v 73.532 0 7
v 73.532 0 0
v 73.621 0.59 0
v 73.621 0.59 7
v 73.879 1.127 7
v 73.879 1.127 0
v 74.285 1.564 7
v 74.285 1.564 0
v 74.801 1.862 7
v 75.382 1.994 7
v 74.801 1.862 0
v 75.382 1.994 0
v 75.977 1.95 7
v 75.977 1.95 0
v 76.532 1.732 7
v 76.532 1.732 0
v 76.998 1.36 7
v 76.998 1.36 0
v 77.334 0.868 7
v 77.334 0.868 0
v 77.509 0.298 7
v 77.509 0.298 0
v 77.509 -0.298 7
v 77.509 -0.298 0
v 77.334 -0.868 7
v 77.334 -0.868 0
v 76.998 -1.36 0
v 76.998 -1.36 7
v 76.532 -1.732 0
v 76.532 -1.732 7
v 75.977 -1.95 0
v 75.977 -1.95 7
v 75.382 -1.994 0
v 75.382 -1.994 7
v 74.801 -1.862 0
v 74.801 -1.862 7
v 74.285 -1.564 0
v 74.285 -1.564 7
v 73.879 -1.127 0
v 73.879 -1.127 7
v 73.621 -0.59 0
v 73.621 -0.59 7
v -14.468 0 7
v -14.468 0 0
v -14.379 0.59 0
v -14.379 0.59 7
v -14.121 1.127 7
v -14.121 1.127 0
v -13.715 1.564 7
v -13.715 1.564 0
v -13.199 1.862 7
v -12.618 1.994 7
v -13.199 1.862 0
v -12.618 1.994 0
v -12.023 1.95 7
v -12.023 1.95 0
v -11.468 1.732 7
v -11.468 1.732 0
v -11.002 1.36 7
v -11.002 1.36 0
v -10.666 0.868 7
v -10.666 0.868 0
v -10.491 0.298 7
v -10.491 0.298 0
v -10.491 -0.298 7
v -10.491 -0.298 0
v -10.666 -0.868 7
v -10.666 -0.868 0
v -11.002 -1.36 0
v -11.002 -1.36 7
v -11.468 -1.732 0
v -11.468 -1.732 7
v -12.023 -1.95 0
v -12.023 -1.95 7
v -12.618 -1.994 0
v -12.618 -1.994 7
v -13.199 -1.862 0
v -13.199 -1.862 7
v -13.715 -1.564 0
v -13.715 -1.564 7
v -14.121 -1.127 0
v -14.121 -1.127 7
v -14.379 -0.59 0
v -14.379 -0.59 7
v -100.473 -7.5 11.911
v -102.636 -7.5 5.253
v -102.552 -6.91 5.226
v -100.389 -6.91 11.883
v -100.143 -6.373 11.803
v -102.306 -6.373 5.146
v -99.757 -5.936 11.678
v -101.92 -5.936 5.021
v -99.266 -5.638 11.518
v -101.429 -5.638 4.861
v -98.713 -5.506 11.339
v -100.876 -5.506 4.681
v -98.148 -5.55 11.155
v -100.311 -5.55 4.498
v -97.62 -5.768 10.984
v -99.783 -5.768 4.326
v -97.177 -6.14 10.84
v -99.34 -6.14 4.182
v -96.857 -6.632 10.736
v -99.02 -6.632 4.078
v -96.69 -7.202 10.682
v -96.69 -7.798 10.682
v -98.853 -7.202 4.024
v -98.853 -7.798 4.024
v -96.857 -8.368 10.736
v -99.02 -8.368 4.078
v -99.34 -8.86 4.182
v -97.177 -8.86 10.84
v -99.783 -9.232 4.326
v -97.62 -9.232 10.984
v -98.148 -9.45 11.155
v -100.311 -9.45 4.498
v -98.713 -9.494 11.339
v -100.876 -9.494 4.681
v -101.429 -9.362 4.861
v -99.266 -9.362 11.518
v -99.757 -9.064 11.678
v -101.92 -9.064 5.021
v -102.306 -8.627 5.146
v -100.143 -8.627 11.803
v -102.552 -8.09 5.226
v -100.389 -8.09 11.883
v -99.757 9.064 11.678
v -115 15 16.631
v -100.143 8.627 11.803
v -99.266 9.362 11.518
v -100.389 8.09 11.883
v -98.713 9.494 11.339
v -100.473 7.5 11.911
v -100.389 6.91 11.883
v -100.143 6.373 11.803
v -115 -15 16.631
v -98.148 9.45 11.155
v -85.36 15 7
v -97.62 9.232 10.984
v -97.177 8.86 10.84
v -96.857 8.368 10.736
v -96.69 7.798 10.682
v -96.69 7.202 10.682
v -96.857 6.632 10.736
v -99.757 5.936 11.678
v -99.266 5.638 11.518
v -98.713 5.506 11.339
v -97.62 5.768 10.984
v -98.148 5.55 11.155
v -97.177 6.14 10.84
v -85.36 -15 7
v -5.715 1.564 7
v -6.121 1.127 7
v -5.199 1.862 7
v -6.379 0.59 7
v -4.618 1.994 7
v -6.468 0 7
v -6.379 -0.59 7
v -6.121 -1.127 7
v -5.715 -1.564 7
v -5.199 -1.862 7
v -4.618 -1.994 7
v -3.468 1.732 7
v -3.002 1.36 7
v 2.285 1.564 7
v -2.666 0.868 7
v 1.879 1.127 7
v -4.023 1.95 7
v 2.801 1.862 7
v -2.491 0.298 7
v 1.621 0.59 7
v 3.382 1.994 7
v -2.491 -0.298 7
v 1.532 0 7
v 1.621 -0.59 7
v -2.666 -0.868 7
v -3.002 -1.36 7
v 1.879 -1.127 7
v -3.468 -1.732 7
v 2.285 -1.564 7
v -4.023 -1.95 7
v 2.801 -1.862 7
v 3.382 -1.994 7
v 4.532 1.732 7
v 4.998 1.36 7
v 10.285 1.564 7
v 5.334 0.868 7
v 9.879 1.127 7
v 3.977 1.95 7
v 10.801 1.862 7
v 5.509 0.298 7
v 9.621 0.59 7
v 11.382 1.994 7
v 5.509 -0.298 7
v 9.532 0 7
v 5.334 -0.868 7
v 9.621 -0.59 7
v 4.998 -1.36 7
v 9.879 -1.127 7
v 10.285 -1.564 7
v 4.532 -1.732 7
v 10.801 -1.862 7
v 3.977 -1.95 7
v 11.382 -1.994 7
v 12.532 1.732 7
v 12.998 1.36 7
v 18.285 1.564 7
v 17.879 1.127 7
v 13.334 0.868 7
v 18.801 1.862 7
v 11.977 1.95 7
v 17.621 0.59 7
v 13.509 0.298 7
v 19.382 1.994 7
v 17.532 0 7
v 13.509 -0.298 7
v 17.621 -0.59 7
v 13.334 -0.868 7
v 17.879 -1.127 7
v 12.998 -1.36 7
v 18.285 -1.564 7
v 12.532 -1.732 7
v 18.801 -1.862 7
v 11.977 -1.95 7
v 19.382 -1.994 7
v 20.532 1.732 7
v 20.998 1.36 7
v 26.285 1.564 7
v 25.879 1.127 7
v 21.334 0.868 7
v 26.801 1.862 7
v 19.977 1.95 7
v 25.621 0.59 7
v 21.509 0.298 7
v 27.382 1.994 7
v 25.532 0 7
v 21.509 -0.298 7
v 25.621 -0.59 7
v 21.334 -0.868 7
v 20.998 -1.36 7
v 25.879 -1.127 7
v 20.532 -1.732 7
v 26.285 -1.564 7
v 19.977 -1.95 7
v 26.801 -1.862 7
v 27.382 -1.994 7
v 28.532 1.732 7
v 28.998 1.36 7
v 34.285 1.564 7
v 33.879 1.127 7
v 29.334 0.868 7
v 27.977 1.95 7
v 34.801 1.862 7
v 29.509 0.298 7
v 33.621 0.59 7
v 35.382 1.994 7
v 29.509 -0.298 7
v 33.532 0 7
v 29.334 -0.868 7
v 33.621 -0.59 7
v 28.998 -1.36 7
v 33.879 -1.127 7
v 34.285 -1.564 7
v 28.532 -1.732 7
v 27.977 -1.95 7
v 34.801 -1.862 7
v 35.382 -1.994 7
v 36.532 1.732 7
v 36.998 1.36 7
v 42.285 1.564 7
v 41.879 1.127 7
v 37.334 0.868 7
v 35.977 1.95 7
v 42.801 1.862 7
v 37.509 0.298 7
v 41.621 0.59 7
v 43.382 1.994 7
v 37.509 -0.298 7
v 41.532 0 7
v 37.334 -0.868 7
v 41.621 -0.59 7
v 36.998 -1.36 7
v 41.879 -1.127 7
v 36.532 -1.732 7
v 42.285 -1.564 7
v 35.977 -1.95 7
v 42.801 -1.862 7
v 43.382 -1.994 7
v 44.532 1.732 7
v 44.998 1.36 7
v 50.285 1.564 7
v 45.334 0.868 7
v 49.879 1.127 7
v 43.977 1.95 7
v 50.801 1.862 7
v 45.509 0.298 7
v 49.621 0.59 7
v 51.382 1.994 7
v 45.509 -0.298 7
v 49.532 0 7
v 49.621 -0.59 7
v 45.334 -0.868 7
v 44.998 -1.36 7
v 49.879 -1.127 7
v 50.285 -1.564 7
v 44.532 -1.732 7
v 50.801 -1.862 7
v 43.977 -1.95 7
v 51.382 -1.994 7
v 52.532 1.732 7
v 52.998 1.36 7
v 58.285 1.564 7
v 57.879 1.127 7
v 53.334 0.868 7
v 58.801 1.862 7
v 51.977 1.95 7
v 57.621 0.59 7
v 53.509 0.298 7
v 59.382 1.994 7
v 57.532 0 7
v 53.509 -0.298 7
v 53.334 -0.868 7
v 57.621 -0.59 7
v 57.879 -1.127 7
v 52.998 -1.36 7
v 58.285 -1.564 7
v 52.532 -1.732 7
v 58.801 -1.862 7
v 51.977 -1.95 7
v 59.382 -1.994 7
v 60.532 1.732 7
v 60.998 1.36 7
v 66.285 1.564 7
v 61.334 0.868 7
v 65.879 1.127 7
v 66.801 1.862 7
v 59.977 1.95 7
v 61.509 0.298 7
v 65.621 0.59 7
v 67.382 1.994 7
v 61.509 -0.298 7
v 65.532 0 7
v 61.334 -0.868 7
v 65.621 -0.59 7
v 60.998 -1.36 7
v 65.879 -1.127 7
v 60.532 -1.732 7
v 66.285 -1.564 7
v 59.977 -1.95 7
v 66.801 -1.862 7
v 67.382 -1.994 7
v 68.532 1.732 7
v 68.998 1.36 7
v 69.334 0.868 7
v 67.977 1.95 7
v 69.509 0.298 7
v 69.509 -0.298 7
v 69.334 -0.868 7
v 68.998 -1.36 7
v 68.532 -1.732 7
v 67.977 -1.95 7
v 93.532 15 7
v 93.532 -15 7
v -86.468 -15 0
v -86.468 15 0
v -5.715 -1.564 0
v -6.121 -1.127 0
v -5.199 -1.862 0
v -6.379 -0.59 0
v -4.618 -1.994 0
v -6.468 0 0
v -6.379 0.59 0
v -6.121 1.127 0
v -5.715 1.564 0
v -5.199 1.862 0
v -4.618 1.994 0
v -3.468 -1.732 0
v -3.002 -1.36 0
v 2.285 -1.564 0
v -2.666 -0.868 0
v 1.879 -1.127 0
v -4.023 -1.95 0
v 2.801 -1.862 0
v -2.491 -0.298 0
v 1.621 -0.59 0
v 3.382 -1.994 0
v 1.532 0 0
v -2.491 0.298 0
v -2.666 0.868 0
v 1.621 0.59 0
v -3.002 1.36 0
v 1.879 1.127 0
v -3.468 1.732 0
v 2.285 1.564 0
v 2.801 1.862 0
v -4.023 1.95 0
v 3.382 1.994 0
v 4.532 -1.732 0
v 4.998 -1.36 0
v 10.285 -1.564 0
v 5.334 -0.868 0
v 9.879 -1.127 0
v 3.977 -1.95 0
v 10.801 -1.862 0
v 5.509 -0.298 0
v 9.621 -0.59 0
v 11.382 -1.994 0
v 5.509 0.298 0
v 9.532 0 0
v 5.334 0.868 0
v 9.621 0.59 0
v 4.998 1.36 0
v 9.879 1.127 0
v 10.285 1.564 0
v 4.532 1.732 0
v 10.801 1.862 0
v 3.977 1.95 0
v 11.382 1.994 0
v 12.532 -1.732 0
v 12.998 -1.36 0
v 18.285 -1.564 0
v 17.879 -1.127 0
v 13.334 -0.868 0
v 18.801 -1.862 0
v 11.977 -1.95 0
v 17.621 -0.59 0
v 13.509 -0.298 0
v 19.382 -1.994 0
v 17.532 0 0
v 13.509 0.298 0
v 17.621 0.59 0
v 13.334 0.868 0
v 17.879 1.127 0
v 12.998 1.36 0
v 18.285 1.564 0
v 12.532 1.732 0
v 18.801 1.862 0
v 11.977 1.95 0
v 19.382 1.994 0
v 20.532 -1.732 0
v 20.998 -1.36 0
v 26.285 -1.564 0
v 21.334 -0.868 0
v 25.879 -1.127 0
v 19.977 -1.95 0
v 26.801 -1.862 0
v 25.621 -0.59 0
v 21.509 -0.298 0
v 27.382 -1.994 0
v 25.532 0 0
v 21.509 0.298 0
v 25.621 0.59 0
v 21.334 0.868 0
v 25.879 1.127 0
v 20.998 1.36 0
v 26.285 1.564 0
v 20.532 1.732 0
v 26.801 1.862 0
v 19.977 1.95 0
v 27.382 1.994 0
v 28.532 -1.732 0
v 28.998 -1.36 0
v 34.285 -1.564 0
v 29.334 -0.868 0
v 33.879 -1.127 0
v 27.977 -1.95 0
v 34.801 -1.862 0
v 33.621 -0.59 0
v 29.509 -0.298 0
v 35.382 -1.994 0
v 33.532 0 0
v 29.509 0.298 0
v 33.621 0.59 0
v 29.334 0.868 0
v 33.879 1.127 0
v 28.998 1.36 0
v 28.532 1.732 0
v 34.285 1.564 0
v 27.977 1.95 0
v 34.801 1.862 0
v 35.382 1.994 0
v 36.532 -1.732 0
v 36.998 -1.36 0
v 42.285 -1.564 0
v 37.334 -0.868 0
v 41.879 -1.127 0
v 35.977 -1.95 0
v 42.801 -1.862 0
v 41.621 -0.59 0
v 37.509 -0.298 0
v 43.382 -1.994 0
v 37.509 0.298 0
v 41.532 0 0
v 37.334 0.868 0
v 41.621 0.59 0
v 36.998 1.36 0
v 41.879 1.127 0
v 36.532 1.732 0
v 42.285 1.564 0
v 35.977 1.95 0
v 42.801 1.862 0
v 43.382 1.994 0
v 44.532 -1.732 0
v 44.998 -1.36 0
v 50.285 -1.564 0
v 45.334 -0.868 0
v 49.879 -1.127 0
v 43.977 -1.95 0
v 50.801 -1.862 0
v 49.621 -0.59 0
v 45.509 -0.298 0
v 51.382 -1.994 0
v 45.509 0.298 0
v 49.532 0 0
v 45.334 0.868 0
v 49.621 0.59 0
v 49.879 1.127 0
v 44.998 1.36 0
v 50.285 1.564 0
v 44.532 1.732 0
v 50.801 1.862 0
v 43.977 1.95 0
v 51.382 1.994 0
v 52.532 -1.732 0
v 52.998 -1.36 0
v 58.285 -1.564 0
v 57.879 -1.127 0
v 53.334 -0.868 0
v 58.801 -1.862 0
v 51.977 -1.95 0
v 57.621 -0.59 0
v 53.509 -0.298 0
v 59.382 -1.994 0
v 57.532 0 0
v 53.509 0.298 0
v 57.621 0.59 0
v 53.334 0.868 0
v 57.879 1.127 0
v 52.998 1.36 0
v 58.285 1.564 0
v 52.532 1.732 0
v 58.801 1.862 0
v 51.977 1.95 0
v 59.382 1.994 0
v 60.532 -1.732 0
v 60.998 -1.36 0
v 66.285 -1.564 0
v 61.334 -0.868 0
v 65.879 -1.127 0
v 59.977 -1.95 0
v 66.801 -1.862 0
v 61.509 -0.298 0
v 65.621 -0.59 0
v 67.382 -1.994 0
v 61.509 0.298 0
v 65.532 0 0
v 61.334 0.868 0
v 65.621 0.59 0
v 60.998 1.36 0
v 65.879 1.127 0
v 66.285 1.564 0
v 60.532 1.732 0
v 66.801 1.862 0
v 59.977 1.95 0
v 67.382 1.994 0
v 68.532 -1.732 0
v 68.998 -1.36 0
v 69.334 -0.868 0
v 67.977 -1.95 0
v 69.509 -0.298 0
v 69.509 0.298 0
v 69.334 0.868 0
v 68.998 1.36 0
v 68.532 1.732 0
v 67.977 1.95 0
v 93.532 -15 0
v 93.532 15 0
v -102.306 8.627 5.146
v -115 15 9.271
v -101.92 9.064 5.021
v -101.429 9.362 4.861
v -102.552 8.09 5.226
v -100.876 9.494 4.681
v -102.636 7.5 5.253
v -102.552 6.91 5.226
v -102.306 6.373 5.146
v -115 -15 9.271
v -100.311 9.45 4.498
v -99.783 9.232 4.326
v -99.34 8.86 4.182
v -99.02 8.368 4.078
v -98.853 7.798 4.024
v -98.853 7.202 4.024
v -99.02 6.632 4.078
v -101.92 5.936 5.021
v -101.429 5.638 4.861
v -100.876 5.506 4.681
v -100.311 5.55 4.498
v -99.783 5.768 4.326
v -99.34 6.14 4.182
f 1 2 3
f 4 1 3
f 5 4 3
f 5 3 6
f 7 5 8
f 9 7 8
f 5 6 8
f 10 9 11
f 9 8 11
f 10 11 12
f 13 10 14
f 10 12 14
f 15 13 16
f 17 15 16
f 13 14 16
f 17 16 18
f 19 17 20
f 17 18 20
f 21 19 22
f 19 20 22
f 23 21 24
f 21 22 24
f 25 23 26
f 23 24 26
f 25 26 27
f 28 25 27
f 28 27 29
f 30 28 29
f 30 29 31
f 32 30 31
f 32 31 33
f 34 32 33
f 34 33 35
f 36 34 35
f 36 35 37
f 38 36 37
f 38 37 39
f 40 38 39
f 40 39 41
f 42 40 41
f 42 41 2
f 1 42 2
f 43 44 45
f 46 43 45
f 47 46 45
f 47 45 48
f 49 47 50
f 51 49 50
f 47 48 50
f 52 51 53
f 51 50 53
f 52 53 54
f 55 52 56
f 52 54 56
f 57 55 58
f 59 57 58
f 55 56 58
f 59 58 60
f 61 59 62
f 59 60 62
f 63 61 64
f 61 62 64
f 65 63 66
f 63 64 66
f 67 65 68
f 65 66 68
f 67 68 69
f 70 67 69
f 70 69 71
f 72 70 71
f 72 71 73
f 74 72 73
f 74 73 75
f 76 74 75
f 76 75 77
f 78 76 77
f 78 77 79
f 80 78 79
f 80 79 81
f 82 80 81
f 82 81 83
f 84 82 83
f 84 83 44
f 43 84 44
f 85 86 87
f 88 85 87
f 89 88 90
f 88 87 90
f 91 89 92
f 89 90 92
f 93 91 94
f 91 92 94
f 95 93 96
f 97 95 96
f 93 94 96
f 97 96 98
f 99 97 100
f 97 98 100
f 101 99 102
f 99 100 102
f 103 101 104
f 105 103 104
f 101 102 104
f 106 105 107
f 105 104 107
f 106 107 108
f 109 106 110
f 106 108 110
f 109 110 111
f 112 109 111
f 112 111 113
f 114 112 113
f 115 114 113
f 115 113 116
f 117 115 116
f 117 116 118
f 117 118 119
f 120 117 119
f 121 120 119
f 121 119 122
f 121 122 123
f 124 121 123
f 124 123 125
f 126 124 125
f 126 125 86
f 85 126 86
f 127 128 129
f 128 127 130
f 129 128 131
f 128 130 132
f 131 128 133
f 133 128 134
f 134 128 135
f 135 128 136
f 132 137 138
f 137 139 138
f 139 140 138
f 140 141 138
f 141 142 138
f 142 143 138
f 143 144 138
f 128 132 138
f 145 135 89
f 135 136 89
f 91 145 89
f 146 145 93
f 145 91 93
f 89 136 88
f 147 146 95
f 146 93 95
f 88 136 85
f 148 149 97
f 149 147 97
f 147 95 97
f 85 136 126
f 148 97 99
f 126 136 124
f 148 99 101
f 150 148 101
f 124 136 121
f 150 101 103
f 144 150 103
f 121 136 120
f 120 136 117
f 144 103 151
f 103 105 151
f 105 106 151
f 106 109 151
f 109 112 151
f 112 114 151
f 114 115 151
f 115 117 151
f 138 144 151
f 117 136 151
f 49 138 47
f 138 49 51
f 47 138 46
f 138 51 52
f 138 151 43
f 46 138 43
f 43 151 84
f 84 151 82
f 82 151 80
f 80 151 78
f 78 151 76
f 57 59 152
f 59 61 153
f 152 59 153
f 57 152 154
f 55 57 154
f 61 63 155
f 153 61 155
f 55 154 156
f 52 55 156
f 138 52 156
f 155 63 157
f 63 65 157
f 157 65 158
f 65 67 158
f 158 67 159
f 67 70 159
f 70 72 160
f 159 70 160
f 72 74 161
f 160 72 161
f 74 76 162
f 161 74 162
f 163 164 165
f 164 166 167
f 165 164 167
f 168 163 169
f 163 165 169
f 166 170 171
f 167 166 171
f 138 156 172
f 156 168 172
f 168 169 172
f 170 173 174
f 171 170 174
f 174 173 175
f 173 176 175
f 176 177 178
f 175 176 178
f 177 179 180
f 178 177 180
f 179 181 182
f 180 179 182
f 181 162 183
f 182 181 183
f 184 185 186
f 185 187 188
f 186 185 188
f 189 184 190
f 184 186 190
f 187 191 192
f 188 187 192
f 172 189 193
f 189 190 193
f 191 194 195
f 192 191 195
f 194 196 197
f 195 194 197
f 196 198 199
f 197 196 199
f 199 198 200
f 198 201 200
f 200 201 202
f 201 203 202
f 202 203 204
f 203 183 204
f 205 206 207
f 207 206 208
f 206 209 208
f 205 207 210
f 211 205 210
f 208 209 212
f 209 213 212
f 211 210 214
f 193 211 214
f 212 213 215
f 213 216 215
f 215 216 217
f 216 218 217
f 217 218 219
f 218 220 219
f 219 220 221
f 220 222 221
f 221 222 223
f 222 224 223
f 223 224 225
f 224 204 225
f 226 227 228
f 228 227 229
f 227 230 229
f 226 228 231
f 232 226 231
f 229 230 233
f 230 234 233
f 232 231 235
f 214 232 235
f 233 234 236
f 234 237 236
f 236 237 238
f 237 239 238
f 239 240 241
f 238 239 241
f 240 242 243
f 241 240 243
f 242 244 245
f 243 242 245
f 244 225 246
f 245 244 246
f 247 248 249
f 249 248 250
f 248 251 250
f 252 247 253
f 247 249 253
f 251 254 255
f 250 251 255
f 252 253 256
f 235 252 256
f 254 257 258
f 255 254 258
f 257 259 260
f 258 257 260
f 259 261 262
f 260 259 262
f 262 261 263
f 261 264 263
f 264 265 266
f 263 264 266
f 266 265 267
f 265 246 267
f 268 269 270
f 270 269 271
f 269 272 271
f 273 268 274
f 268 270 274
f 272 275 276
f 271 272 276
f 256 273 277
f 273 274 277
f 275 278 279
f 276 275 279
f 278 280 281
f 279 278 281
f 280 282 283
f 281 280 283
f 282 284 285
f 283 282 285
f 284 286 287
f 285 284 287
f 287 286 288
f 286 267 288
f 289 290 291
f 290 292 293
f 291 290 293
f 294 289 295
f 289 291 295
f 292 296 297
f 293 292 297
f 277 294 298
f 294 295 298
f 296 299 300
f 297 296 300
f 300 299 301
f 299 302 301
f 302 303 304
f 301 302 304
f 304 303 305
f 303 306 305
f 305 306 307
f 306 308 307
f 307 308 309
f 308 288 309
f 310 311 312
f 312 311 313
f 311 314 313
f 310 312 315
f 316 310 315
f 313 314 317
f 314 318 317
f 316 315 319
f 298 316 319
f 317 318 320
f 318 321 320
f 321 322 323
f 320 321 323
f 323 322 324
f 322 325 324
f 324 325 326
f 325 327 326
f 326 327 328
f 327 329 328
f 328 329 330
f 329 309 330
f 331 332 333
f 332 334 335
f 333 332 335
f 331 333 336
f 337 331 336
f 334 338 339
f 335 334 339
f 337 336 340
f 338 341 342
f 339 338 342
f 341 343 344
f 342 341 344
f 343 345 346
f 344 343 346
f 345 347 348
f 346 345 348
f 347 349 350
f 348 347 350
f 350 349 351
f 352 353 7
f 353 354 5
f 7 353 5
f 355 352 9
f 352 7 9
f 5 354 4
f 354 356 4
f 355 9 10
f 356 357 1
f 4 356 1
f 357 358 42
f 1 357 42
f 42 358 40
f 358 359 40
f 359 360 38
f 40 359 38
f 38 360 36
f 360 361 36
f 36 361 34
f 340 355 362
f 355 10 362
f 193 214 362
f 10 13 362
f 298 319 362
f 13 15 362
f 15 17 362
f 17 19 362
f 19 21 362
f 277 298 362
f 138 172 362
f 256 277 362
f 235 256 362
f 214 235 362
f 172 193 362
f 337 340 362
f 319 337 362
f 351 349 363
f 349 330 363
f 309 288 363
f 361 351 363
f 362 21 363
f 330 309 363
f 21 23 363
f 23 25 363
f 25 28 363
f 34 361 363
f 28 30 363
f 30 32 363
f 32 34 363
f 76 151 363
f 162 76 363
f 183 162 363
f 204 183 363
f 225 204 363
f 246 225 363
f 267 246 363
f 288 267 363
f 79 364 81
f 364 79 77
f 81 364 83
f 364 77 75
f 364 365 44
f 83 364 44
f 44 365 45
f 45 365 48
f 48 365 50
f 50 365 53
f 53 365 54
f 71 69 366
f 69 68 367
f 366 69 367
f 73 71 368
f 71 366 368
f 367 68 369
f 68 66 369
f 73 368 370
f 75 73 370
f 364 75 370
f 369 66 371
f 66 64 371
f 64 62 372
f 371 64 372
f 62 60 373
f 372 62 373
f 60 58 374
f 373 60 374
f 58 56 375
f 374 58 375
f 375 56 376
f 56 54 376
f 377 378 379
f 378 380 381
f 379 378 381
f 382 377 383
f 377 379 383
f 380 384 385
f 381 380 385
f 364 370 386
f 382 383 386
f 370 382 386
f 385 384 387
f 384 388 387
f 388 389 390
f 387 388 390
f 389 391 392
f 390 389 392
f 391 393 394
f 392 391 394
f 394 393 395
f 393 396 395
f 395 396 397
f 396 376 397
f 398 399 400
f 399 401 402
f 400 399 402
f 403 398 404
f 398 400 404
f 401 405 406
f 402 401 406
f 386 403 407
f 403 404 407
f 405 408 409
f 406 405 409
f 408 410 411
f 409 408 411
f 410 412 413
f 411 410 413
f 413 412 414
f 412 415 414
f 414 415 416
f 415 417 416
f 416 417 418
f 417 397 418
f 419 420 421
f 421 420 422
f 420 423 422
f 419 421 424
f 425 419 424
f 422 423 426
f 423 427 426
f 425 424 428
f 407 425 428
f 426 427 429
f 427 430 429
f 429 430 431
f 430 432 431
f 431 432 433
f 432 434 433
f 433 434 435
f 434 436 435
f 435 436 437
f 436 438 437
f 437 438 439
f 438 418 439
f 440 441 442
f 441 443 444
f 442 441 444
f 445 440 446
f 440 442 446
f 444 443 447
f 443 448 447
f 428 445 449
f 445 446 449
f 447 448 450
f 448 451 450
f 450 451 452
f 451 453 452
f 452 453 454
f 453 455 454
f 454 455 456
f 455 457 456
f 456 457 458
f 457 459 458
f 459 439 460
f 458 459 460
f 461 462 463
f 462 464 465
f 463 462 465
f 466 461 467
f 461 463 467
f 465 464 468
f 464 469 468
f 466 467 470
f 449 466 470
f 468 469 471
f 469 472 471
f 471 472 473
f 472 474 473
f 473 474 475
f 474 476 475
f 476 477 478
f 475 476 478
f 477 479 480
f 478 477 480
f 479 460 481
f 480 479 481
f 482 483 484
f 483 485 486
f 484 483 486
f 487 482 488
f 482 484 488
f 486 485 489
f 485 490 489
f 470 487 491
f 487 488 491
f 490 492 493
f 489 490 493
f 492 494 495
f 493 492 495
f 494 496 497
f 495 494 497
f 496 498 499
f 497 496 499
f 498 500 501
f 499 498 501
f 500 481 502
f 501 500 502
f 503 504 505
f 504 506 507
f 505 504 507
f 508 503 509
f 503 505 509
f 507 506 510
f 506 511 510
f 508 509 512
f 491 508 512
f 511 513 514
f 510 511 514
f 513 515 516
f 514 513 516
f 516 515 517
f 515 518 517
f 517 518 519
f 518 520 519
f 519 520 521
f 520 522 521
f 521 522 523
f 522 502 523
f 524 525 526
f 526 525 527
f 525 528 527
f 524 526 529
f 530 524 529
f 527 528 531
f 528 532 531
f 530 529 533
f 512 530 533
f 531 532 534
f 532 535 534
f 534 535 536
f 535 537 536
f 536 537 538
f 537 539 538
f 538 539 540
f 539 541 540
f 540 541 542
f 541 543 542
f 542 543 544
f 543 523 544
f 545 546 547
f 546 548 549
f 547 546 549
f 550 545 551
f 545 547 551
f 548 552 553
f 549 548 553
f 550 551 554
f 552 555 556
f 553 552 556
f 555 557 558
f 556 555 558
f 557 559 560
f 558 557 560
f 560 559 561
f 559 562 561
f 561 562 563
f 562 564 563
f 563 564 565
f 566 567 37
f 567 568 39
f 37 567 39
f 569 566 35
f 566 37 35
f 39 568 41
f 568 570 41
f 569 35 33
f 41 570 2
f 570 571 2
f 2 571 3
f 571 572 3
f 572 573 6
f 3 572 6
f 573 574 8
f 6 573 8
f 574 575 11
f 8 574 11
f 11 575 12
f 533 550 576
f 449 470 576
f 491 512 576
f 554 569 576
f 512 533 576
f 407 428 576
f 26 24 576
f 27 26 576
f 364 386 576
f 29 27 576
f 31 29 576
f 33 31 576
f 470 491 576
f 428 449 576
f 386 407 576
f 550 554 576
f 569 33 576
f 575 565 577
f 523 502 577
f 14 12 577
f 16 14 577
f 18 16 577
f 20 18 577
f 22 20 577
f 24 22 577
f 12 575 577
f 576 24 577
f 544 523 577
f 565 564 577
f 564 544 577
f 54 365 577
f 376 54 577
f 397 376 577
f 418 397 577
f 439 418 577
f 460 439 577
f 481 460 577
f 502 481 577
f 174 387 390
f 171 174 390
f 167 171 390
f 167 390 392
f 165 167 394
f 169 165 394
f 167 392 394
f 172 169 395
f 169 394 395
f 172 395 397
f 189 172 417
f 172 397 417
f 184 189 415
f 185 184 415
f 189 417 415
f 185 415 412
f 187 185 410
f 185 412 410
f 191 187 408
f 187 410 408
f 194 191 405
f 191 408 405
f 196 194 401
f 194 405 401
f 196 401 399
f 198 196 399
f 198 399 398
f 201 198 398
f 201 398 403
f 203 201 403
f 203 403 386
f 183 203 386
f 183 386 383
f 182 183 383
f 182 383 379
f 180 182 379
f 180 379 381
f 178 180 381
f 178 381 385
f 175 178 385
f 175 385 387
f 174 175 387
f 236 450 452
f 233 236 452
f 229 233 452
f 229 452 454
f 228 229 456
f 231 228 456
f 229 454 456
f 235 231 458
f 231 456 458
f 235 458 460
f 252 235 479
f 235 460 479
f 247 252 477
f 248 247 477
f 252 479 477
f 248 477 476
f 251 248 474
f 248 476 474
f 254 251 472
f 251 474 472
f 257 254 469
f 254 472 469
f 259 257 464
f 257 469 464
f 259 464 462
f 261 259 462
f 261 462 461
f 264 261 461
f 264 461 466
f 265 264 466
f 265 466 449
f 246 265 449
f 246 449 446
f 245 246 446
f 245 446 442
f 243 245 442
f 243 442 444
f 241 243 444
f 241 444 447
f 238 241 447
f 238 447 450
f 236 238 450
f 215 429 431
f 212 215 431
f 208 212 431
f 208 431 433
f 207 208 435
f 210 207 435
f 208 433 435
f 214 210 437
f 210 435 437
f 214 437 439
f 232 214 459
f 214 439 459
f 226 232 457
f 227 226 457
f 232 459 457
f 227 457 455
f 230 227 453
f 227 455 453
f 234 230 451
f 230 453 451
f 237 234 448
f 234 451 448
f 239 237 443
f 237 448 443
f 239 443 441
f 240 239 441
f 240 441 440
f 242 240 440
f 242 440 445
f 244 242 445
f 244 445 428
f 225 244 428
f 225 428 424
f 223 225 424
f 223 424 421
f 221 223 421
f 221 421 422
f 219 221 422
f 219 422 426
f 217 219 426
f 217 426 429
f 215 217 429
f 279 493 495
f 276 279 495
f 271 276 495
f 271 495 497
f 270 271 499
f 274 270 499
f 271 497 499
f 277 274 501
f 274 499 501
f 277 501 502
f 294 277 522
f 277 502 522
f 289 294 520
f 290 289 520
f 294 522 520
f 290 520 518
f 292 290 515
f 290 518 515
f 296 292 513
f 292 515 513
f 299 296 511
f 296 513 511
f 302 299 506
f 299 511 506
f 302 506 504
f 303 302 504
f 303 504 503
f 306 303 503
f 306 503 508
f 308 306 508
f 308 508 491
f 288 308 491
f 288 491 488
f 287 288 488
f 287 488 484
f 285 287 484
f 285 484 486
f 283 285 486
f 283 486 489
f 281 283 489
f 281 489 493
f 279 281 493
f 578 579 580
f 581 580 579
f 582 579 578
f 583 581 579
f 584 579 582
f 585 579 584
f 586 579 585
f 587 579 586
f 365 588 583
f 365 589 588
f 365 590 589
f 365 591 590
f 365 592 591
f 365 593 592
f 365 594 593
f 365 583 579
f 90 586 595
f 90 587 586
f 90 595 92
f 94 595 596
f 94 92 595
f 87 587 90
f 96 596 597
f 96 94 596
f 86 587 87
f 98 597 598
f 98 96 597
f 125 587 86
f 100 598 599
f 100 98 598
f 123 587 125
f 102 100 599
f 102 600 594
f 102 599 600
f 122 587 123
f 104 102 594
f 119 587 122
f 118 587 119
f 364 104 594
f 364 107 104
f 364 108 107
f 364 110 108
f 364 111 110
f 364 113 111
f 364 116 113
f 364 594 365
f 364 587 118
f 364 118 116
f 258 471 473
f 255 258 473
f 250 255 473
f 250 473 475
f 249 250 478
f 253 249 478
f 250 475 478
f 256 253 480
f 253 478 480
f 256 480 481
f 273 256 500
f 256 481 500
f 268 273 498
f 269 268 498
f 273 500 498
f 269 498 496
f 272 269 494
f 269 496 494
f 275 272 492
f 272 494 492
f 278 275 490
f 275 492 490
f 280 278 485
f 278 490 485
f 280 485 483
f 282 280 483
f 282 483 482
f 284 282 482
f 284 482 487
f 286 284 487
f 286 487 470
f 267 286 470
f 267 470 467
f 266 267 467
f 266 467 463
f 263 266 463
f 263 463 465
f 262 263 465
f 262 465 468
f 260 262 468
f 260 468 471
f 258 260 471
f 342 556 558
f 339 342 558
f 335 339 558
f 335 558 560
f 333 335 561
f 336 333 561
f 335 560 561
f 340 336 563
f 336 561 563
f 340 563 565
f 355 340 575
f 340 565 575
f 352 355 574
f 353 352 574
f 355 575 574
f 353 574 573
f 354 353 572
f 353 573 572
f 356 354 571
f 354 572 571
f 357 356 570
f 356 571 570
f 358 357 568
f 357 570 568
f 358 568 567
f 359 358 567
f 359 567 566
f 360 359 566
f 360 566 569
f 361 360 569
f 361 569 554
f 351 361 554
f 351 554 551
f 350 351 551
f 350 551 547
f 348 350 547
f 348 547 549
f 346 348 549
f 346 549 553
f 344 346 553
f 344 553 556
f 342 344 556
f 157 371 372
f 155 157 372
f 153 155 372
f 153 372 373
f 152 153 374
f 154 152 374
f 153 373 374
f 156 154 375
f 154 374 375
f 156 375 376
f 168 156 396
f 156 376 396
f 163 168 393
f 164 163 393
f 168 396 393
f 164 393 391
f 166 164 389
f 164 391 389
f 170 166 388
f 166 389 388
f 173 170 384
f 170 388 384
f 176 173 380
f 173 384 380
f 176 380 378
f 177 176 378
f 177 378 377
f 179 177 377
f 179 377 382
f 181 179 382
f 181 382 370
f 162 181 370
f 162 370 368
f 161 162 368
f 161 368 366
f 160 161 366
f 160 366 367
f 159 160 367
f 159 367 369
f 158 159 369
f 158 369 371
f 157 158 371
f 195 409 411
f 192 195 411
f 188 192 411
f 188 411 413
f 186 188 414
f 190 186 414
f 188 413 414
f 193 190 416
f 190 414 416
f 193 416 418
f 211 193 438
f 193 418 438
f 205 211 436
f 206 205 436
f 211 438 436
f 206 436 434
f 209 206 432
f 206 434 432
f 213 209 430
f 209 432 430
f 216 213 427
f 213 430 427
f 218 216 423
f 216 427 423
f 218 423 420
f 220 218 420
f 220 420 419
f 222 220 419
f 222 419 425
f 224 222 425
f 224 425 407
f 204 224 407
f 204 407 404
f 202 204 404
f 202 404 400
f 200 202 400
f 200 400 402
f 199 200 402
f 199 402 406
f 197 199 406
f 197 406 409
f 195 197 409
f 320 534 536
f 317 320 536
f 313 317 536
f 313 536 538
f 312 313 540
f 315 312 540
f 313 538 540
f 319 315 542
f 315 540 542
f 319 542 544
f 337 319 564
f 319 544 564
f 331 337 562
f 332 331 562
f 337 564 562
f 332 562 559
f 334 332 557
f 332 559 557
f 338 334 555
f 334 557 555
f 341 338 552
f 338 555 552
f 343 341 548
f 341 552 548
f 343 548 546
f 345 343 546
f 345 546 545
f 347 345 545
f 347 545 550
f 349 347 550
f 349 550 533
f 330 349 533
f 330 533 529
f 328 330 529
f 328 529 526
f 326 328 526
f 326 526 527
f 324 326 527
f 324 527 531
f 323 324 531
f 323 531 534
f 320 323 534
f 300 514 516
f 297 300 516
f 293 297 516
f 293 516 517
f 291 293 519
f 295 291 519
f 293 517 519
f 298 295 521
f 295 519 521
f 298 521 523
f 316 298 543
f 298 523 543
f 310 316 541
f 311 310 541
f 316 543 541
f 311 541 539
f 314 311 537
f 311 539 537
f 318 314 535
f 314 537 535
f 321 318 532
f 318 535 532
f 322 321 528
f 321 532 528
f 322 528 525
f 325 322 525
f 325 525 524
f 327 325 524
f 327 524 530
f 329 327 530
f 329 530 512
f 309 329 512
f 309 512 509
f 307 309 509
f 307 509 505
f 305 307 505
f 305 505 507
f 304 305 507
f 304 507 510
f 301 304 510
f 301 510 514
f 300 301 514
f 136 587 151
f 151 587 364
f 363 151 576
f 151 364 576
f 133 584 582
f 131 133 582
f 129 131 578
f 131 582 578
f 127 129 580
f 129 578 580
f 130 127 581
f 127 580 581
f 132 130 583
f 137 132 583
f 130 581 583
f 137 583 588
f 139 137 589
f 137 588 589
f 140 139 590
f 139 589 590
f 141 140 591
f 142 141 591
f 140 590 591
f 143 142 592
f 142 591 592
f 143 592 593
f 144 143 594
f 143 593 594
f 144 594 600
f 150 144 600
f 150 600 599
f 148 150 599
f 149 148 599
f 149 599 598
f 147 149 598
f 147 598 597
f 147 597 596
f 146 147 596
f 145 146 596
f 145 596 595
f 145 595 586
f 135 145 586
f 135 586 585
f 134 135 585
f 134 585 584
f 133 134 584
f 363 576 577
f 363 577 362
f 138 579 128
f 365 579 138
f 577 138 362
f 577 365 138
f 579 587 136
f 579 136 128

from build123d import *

# Parameters (mm, degrees)
SKETCH1_W           = 230
SKETCH1_H           = 30
BOSS_EXTRUDE1_DEPTH = 50
CUT_EXTRUDE1_DEPTH  = 50
SKETCH3_W           = 21.468304511
SKETCH3_H           = 50
CUT_EXTRUDE2_DEPTH  = 50
CUT_EXTRUDE3_DEPTH  = 50
SKETCH5_R           = 2
CUT_EXTRUDE4_DEPTH  = 50
SKETCH6_R           = 2
CUT_EXTRUDE5_DEPTH  = 50


with BuildPart() as part:
    # Sketch1 → Boss-Extrude1 (new body)
    with BuildSketch(Plane.XY):
        Rectangle(SKETCH1_W, SKETCH1_H)
    extrude(amount=BOSS_EXTRUDE1_DEPTH)

    # Sketch2 → Cut-Extrude1 (cut)
    with BuildSketch(Plane.XZ.offset(15)):
        Polygon((-115, 9.270509831), (-86.468304511, 0), (-115, 0), align=None)
    extrude(amount=-CUT_EXTRUDE1_DEPTH, mode=Mode.SUBTRACT)

    # Sketch3 → Cut-Extrude2 (cut)
    with BuildSketch(Plane.XZ.offset(15)):
        with Locations((104.265847745, 25)):
            Rectangle(SKETCH3_W, SKETCH3_H)
    extrude(amount=-CUT_EXTRUDE2_DEPTH, mode=Mode.SUBTRACT)

    # Sketch4 → Cut-Extrude3 (cut)
    with BuildSketch(Plane.XZ.offset(15)):
        Polygon((-115, 16.630745401), (-85.359613429, 7), (93.531695489, 7), (93.531695489, 50), (-115, 50), align=None)
    extrude(amount=-CUT_EXTRUDE3_DEPTH, mode=Mode.SUBTRACT)

    # Sketch5 → Cut-Extrude4 (cut)
    with BuildSketch(Plane(origin=(-8.256988343, 0, -25.412397091), x_dir=(-0.9510565162951533, 0, 0.3090169943749483), z_dir=(-0.3090169943749483, 0, -0.9510565162951534))):
        with Locations((97.236244458, 7.5)):
            Circle(SKETCH5_R)
        with Locations((97.236244458, -7.5)):
            Circle(SKETCH5_R)
    extrude(amount=-CUT_EXTRUDE4_DEPTH, mode=Mode.SUBTRACT)

    # Sketch6 → Cut-Extrude5 (cut)
    with BuildSketch(Plane(origin=(0, 0, 0), x_dir=(-1, 0, 0), z_dir=(0, 0, -1))):
        with Locations((-51.531695489, 0)):
            Circle(SKETCH6_R)
        with Locations((-59.531695489, 0)):
            Circle(SKETCH6_R)
        with Locations((-67.531695489, 0)):
            Circle(SKETCH6_R)
        with Locations((-75.531695489, 0)):
            Circle(SKETCH6_R)
        with Locations((-43.531695489, 0)):
            Circle(SKETCH6_R)
        with Locations((-35.531695489, 0)):
            Circle(SKETCH6_R)
        with Locations((-27.531695489, 0)):
            Circle(SKETCH6_R)
        with Locations((-19.531695489, 0)):
            Circle(SKETCH6_R)
        with Locations((-11.531695489, 0)):
            Circle(SKETCH6_R)
        with Locations((-3.531695489, 0)):
            Circle(SKETCH6_R)
        with Locations((4.468304511, 0)):
            Circle(SKETCH6_R)
        with Locations((12.468304511, 0)):
            Circle(SKETCH6_R)
    extrude(amount=-CUT_EXTRUDE5_DEPTH, mode=Mode.SUBTRACT)


solid = part.part
